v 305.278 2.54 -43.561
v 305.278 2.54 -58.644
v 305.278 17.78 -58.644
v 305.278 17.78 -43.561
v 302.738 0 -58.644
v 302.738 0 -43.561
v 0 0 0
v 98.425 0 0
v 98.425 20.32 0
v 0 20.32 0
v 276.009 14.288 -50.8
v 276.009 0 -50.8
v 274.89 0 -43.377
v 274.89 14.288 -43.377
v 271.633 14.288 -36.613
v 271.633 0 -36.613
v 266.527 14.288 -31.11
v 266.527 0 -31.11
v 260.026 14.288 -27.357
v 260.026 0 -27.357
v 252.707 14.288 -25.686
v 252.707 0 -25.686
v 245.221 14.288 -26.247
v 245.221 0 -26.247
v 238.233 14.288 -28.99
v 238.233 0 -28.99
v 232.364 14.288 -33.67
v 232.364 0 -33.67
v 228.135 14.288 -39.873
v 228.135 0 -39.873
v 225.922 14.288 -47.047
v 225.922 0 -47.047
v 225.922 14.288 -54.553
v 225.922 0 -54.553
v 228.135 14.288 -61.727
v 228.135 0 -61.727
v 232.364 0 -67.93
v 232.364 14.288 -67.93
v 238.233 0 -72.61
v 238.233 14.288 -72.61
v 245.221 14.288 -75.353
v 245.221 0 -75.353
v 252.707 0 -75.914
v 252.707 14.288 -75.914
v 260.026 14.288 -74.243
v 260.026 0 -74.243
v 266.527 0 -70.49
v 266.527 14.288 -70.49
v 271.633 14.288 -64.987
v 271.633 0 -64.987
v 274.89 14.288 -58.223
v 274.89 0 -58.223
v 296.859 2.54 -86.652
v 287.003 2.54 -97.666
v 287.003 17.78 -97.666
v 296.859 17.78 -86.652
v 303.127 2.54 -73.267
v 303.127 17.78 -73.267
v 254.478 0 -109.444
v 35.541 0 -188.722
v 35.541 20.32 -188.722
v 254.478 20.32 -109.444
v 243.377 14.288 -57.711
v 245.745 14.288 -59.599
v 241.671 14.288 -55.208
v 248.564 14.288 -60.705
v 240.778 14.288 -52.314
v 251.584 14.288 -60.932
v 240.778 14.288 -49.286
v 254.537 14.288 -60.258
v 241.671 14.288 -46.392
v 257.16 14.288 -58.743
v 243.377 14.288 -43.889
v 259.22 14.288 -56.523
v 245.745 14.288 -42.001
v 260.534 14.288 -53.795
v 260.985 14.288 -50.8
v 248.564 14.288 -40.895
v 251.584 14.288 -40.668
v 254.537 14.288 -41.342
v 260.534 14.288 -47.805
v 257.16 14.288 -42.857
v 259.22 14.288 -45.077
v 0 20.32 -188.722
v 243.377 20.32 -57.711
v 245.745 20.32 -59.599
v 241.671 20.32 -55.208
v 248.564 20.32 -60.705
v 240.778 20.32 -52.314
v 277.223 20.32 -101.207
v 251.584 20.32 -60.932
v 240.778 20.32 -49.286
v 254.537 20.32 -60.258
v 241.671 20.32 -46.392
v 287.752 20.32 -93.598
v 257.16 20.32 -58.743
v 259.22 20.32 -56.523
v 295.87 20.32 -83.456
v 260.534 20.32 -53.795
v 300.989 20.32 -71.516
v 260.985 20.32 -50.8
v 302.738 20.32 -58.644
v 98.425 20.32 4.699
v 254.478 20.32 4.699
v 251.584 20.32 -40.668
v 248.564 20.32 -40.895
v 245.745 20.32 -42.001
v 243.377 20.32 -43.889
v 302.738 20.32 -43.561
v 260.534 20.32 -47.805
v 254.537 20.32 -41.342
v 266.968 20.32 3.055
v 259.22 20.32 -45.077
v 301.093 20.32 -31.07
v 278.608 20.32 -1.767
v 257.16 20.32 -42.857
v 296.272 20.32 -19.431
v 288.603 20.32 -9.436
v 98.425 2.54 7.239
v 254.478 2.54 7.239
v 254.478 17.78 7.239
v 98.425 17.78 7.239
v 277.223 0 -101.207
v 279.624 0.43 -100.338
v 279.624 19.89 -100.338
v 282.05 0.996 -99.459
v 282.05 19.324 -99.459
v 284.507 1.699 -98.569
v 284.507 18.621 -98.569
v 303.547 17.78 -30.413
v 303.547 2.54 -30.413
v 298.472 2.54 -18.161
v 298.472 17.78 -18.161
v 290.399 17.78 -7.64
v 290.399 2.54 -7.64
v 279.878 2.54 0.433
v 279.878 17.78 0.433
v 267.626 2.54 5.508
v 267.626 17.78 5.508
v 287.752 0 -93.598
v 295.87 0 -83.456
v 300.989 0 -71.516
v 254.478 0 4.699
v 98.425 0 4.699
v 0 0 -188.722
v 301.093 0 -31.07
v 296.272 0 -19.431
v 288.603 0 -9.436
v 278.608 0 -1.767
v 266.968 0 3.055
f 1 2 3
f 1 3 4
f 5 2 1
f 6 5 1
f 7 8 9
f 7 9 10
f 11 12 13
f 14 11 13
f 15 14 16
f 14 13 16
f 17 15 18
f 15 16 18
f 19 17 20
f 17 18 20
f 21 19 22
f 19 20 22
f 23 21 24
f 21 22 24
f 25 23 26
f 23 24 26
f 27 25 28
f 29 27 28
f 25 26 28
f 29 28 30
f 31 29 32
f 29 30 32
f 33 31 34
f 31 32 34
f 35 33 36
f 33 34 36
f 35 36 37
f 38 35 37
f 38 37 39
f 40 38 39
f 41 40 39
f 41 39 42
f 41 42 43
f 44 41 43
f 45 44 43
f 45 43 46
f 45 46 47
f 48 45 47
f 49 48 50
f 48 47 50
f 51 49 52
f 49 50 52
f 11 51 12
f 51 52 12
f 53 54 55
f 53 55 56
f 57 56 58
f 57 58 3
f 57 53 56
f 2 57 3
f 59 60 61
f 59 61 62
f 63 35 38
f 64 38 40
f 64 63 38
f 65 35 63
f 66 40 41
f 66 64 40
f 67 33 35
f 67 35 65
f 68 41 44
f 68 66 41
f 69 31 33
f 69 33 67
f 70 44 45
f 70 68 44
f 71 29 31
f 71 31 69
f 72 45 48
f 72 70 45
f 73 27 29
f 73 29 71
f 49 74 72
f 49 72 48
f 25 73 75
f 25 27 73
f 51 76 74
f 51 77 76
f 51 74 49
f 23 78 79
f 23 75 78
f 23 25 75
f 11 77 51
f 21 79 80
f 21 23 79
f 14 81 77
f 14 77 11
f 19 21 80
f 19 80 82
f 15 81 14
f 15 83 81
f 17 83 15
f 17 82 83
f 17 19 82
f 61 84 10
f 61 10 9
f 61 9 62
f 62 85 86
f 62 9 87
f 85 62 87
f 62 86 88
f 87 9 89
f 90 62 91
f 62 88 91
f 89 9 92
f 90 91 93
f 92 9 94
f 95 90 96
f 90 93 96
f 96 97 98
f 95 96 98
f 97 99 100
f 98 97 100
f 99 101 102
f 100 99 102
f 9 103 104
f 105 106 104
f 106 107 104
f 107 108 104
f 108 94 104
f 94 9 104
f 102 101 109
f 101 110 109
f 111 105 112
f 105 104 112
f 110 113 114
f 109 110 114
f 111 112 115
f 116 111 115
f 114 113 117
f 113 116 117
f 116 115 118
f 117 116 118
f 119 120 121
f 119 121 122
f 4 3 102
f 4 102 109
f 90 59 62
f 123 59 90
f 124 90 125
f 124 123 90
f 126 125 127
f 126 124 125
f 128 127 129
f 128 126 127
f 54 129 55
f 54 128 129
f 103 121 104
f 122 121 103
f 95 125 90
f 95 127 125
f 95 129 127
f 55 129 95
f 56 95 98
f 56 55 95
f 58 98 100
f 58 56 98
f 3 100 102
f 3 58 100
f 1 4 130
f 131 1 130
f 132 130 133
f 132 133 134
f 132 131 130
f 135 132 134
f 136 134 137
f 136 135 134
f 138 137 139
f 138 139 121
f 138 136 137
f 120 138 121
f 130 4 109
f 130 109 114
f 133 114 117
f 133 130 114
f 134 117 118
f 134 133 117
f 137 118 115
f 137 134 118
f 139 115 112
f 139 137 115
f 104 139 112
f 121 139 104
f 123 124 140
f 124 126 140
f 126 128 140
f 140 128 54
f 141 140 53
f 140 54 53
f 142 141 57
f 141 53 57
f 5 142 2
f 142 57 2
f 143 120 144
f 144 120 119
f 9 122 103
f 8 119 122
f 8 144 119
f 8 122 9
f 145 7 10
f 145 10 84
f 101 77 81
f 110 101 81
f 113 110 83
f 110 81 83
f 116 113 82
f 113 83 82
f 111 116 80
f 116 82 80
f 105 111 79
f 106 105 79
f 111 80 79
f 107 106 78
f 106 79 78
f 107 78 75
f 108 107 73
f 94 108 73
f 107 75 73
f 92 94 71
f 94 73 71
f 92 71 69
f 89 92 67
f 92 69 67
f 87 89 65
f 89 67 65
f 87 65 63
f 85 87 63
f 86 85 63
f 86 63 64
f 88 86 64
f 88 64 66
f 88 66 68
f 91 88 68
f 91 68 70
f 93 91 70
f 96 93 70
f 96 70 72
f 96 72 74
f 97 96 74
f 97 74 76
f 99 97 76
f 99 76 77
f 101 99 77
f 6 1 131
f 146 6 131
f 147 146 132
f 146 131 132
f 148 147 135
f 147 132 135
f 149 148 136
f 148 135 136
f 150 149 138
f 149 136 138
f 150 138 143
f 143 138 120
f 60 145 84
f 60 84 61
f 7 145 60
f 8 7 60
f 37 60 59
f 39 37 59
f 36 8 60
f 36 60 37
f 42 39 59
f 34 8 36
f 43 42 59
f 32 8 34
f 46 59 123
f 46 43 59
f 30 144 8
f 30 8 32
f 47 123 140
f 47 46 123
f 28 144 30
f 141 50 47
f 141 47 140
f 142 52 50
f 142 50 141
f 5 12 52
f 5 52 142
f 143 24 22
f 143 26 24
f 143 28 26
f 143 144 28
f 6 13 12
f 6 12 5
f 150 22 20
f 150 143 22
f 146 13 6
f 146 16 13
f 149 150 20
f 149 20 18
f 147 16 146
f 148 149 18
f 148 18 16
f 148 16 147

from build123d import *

# Parameters (mm, degrees)
F0_R     = 25.1841
F0_R_2   = 10.16
F1_DEPTH = 20.32
F2_DEPTH = 14.2875
F3_DEPTH = 25.4
F4_SIZE  = 2.54


with BuildPart() as f1:
    # F0 (on Front) → F1 (new body)
    with BuildSketch(Plane.XZ):
        with BuildLine():
            Line((98.425, 0), (0, 0))
            Line((0, 0), (0, -188.722))
            Line((0, -188.722), (35.541445, -188.722))
            Line((35.541445, -188.722), (254.477584, -109.443526))
            Line((254.477584, -109.443526), (287.002941, -97.665842))
            ThreePointArc((287.002941, -97.665842), (300.482628, -80.188269), (305.277584, -58.643526))
            Line((305.277584, -58.643526), (305.277584, -43.561))
            ThreePointArc((305.277584, -43.561), (290.398609, -7.639976), (254.477584, 7.239))
            Line((254.477584, 7.239), (152.877584, 7.239))
            Line((152.877584, 7.239), (98.425, 7.239))
            Line((98.425, 7.239), (98.425, 0))
        make_face()
        with Locations((250.825, -50.8)):
            Circle(F0_R, mode=Mode.SUBTRACT)
        with Locations((250.825, -50.8)):
            Circle(F0_R)
        with Locations((250.825, -50.8)):
            Circle(F0_R_2, mode=Mode.SUBTRACT)
        with Locations((250.825, -50.8)):
            Circle(F0_R_2)
    extrude(amount=-F1_DEPTH)

    # F0 (on Front) → F2 (cut)
    with BuildSketch(Plane.XZ):
        with Locations((250.825, -50.8)):
            Circle(F0_R)
        with Locations((250.825, -50.8)):
            Circle(F0_R_2, mode=Mode.SUBTRACT)
    extrude(amount=-F2_DEPTH, mode=Mode.SUBTRACT)

    # F0 (on Front) → F3 (cut)
    with BuildSketch(Plane.XZ):
        with Locations((250.825, -50.8)):
            Circle(F0_R_2)
    extrude(amount=-F3_DEPTH, mode=Mode.SUBTRACT)

    # F4
    f4_edges = [f1.edges().sort_by_distance(p)[0] for p in [
        (176.451292, 0, 7.239),
        (176.451292, 20.32, 7.239),
    ]]
    chamfer(f4_edges, length=F4_SIZE)


solid = f1.part
